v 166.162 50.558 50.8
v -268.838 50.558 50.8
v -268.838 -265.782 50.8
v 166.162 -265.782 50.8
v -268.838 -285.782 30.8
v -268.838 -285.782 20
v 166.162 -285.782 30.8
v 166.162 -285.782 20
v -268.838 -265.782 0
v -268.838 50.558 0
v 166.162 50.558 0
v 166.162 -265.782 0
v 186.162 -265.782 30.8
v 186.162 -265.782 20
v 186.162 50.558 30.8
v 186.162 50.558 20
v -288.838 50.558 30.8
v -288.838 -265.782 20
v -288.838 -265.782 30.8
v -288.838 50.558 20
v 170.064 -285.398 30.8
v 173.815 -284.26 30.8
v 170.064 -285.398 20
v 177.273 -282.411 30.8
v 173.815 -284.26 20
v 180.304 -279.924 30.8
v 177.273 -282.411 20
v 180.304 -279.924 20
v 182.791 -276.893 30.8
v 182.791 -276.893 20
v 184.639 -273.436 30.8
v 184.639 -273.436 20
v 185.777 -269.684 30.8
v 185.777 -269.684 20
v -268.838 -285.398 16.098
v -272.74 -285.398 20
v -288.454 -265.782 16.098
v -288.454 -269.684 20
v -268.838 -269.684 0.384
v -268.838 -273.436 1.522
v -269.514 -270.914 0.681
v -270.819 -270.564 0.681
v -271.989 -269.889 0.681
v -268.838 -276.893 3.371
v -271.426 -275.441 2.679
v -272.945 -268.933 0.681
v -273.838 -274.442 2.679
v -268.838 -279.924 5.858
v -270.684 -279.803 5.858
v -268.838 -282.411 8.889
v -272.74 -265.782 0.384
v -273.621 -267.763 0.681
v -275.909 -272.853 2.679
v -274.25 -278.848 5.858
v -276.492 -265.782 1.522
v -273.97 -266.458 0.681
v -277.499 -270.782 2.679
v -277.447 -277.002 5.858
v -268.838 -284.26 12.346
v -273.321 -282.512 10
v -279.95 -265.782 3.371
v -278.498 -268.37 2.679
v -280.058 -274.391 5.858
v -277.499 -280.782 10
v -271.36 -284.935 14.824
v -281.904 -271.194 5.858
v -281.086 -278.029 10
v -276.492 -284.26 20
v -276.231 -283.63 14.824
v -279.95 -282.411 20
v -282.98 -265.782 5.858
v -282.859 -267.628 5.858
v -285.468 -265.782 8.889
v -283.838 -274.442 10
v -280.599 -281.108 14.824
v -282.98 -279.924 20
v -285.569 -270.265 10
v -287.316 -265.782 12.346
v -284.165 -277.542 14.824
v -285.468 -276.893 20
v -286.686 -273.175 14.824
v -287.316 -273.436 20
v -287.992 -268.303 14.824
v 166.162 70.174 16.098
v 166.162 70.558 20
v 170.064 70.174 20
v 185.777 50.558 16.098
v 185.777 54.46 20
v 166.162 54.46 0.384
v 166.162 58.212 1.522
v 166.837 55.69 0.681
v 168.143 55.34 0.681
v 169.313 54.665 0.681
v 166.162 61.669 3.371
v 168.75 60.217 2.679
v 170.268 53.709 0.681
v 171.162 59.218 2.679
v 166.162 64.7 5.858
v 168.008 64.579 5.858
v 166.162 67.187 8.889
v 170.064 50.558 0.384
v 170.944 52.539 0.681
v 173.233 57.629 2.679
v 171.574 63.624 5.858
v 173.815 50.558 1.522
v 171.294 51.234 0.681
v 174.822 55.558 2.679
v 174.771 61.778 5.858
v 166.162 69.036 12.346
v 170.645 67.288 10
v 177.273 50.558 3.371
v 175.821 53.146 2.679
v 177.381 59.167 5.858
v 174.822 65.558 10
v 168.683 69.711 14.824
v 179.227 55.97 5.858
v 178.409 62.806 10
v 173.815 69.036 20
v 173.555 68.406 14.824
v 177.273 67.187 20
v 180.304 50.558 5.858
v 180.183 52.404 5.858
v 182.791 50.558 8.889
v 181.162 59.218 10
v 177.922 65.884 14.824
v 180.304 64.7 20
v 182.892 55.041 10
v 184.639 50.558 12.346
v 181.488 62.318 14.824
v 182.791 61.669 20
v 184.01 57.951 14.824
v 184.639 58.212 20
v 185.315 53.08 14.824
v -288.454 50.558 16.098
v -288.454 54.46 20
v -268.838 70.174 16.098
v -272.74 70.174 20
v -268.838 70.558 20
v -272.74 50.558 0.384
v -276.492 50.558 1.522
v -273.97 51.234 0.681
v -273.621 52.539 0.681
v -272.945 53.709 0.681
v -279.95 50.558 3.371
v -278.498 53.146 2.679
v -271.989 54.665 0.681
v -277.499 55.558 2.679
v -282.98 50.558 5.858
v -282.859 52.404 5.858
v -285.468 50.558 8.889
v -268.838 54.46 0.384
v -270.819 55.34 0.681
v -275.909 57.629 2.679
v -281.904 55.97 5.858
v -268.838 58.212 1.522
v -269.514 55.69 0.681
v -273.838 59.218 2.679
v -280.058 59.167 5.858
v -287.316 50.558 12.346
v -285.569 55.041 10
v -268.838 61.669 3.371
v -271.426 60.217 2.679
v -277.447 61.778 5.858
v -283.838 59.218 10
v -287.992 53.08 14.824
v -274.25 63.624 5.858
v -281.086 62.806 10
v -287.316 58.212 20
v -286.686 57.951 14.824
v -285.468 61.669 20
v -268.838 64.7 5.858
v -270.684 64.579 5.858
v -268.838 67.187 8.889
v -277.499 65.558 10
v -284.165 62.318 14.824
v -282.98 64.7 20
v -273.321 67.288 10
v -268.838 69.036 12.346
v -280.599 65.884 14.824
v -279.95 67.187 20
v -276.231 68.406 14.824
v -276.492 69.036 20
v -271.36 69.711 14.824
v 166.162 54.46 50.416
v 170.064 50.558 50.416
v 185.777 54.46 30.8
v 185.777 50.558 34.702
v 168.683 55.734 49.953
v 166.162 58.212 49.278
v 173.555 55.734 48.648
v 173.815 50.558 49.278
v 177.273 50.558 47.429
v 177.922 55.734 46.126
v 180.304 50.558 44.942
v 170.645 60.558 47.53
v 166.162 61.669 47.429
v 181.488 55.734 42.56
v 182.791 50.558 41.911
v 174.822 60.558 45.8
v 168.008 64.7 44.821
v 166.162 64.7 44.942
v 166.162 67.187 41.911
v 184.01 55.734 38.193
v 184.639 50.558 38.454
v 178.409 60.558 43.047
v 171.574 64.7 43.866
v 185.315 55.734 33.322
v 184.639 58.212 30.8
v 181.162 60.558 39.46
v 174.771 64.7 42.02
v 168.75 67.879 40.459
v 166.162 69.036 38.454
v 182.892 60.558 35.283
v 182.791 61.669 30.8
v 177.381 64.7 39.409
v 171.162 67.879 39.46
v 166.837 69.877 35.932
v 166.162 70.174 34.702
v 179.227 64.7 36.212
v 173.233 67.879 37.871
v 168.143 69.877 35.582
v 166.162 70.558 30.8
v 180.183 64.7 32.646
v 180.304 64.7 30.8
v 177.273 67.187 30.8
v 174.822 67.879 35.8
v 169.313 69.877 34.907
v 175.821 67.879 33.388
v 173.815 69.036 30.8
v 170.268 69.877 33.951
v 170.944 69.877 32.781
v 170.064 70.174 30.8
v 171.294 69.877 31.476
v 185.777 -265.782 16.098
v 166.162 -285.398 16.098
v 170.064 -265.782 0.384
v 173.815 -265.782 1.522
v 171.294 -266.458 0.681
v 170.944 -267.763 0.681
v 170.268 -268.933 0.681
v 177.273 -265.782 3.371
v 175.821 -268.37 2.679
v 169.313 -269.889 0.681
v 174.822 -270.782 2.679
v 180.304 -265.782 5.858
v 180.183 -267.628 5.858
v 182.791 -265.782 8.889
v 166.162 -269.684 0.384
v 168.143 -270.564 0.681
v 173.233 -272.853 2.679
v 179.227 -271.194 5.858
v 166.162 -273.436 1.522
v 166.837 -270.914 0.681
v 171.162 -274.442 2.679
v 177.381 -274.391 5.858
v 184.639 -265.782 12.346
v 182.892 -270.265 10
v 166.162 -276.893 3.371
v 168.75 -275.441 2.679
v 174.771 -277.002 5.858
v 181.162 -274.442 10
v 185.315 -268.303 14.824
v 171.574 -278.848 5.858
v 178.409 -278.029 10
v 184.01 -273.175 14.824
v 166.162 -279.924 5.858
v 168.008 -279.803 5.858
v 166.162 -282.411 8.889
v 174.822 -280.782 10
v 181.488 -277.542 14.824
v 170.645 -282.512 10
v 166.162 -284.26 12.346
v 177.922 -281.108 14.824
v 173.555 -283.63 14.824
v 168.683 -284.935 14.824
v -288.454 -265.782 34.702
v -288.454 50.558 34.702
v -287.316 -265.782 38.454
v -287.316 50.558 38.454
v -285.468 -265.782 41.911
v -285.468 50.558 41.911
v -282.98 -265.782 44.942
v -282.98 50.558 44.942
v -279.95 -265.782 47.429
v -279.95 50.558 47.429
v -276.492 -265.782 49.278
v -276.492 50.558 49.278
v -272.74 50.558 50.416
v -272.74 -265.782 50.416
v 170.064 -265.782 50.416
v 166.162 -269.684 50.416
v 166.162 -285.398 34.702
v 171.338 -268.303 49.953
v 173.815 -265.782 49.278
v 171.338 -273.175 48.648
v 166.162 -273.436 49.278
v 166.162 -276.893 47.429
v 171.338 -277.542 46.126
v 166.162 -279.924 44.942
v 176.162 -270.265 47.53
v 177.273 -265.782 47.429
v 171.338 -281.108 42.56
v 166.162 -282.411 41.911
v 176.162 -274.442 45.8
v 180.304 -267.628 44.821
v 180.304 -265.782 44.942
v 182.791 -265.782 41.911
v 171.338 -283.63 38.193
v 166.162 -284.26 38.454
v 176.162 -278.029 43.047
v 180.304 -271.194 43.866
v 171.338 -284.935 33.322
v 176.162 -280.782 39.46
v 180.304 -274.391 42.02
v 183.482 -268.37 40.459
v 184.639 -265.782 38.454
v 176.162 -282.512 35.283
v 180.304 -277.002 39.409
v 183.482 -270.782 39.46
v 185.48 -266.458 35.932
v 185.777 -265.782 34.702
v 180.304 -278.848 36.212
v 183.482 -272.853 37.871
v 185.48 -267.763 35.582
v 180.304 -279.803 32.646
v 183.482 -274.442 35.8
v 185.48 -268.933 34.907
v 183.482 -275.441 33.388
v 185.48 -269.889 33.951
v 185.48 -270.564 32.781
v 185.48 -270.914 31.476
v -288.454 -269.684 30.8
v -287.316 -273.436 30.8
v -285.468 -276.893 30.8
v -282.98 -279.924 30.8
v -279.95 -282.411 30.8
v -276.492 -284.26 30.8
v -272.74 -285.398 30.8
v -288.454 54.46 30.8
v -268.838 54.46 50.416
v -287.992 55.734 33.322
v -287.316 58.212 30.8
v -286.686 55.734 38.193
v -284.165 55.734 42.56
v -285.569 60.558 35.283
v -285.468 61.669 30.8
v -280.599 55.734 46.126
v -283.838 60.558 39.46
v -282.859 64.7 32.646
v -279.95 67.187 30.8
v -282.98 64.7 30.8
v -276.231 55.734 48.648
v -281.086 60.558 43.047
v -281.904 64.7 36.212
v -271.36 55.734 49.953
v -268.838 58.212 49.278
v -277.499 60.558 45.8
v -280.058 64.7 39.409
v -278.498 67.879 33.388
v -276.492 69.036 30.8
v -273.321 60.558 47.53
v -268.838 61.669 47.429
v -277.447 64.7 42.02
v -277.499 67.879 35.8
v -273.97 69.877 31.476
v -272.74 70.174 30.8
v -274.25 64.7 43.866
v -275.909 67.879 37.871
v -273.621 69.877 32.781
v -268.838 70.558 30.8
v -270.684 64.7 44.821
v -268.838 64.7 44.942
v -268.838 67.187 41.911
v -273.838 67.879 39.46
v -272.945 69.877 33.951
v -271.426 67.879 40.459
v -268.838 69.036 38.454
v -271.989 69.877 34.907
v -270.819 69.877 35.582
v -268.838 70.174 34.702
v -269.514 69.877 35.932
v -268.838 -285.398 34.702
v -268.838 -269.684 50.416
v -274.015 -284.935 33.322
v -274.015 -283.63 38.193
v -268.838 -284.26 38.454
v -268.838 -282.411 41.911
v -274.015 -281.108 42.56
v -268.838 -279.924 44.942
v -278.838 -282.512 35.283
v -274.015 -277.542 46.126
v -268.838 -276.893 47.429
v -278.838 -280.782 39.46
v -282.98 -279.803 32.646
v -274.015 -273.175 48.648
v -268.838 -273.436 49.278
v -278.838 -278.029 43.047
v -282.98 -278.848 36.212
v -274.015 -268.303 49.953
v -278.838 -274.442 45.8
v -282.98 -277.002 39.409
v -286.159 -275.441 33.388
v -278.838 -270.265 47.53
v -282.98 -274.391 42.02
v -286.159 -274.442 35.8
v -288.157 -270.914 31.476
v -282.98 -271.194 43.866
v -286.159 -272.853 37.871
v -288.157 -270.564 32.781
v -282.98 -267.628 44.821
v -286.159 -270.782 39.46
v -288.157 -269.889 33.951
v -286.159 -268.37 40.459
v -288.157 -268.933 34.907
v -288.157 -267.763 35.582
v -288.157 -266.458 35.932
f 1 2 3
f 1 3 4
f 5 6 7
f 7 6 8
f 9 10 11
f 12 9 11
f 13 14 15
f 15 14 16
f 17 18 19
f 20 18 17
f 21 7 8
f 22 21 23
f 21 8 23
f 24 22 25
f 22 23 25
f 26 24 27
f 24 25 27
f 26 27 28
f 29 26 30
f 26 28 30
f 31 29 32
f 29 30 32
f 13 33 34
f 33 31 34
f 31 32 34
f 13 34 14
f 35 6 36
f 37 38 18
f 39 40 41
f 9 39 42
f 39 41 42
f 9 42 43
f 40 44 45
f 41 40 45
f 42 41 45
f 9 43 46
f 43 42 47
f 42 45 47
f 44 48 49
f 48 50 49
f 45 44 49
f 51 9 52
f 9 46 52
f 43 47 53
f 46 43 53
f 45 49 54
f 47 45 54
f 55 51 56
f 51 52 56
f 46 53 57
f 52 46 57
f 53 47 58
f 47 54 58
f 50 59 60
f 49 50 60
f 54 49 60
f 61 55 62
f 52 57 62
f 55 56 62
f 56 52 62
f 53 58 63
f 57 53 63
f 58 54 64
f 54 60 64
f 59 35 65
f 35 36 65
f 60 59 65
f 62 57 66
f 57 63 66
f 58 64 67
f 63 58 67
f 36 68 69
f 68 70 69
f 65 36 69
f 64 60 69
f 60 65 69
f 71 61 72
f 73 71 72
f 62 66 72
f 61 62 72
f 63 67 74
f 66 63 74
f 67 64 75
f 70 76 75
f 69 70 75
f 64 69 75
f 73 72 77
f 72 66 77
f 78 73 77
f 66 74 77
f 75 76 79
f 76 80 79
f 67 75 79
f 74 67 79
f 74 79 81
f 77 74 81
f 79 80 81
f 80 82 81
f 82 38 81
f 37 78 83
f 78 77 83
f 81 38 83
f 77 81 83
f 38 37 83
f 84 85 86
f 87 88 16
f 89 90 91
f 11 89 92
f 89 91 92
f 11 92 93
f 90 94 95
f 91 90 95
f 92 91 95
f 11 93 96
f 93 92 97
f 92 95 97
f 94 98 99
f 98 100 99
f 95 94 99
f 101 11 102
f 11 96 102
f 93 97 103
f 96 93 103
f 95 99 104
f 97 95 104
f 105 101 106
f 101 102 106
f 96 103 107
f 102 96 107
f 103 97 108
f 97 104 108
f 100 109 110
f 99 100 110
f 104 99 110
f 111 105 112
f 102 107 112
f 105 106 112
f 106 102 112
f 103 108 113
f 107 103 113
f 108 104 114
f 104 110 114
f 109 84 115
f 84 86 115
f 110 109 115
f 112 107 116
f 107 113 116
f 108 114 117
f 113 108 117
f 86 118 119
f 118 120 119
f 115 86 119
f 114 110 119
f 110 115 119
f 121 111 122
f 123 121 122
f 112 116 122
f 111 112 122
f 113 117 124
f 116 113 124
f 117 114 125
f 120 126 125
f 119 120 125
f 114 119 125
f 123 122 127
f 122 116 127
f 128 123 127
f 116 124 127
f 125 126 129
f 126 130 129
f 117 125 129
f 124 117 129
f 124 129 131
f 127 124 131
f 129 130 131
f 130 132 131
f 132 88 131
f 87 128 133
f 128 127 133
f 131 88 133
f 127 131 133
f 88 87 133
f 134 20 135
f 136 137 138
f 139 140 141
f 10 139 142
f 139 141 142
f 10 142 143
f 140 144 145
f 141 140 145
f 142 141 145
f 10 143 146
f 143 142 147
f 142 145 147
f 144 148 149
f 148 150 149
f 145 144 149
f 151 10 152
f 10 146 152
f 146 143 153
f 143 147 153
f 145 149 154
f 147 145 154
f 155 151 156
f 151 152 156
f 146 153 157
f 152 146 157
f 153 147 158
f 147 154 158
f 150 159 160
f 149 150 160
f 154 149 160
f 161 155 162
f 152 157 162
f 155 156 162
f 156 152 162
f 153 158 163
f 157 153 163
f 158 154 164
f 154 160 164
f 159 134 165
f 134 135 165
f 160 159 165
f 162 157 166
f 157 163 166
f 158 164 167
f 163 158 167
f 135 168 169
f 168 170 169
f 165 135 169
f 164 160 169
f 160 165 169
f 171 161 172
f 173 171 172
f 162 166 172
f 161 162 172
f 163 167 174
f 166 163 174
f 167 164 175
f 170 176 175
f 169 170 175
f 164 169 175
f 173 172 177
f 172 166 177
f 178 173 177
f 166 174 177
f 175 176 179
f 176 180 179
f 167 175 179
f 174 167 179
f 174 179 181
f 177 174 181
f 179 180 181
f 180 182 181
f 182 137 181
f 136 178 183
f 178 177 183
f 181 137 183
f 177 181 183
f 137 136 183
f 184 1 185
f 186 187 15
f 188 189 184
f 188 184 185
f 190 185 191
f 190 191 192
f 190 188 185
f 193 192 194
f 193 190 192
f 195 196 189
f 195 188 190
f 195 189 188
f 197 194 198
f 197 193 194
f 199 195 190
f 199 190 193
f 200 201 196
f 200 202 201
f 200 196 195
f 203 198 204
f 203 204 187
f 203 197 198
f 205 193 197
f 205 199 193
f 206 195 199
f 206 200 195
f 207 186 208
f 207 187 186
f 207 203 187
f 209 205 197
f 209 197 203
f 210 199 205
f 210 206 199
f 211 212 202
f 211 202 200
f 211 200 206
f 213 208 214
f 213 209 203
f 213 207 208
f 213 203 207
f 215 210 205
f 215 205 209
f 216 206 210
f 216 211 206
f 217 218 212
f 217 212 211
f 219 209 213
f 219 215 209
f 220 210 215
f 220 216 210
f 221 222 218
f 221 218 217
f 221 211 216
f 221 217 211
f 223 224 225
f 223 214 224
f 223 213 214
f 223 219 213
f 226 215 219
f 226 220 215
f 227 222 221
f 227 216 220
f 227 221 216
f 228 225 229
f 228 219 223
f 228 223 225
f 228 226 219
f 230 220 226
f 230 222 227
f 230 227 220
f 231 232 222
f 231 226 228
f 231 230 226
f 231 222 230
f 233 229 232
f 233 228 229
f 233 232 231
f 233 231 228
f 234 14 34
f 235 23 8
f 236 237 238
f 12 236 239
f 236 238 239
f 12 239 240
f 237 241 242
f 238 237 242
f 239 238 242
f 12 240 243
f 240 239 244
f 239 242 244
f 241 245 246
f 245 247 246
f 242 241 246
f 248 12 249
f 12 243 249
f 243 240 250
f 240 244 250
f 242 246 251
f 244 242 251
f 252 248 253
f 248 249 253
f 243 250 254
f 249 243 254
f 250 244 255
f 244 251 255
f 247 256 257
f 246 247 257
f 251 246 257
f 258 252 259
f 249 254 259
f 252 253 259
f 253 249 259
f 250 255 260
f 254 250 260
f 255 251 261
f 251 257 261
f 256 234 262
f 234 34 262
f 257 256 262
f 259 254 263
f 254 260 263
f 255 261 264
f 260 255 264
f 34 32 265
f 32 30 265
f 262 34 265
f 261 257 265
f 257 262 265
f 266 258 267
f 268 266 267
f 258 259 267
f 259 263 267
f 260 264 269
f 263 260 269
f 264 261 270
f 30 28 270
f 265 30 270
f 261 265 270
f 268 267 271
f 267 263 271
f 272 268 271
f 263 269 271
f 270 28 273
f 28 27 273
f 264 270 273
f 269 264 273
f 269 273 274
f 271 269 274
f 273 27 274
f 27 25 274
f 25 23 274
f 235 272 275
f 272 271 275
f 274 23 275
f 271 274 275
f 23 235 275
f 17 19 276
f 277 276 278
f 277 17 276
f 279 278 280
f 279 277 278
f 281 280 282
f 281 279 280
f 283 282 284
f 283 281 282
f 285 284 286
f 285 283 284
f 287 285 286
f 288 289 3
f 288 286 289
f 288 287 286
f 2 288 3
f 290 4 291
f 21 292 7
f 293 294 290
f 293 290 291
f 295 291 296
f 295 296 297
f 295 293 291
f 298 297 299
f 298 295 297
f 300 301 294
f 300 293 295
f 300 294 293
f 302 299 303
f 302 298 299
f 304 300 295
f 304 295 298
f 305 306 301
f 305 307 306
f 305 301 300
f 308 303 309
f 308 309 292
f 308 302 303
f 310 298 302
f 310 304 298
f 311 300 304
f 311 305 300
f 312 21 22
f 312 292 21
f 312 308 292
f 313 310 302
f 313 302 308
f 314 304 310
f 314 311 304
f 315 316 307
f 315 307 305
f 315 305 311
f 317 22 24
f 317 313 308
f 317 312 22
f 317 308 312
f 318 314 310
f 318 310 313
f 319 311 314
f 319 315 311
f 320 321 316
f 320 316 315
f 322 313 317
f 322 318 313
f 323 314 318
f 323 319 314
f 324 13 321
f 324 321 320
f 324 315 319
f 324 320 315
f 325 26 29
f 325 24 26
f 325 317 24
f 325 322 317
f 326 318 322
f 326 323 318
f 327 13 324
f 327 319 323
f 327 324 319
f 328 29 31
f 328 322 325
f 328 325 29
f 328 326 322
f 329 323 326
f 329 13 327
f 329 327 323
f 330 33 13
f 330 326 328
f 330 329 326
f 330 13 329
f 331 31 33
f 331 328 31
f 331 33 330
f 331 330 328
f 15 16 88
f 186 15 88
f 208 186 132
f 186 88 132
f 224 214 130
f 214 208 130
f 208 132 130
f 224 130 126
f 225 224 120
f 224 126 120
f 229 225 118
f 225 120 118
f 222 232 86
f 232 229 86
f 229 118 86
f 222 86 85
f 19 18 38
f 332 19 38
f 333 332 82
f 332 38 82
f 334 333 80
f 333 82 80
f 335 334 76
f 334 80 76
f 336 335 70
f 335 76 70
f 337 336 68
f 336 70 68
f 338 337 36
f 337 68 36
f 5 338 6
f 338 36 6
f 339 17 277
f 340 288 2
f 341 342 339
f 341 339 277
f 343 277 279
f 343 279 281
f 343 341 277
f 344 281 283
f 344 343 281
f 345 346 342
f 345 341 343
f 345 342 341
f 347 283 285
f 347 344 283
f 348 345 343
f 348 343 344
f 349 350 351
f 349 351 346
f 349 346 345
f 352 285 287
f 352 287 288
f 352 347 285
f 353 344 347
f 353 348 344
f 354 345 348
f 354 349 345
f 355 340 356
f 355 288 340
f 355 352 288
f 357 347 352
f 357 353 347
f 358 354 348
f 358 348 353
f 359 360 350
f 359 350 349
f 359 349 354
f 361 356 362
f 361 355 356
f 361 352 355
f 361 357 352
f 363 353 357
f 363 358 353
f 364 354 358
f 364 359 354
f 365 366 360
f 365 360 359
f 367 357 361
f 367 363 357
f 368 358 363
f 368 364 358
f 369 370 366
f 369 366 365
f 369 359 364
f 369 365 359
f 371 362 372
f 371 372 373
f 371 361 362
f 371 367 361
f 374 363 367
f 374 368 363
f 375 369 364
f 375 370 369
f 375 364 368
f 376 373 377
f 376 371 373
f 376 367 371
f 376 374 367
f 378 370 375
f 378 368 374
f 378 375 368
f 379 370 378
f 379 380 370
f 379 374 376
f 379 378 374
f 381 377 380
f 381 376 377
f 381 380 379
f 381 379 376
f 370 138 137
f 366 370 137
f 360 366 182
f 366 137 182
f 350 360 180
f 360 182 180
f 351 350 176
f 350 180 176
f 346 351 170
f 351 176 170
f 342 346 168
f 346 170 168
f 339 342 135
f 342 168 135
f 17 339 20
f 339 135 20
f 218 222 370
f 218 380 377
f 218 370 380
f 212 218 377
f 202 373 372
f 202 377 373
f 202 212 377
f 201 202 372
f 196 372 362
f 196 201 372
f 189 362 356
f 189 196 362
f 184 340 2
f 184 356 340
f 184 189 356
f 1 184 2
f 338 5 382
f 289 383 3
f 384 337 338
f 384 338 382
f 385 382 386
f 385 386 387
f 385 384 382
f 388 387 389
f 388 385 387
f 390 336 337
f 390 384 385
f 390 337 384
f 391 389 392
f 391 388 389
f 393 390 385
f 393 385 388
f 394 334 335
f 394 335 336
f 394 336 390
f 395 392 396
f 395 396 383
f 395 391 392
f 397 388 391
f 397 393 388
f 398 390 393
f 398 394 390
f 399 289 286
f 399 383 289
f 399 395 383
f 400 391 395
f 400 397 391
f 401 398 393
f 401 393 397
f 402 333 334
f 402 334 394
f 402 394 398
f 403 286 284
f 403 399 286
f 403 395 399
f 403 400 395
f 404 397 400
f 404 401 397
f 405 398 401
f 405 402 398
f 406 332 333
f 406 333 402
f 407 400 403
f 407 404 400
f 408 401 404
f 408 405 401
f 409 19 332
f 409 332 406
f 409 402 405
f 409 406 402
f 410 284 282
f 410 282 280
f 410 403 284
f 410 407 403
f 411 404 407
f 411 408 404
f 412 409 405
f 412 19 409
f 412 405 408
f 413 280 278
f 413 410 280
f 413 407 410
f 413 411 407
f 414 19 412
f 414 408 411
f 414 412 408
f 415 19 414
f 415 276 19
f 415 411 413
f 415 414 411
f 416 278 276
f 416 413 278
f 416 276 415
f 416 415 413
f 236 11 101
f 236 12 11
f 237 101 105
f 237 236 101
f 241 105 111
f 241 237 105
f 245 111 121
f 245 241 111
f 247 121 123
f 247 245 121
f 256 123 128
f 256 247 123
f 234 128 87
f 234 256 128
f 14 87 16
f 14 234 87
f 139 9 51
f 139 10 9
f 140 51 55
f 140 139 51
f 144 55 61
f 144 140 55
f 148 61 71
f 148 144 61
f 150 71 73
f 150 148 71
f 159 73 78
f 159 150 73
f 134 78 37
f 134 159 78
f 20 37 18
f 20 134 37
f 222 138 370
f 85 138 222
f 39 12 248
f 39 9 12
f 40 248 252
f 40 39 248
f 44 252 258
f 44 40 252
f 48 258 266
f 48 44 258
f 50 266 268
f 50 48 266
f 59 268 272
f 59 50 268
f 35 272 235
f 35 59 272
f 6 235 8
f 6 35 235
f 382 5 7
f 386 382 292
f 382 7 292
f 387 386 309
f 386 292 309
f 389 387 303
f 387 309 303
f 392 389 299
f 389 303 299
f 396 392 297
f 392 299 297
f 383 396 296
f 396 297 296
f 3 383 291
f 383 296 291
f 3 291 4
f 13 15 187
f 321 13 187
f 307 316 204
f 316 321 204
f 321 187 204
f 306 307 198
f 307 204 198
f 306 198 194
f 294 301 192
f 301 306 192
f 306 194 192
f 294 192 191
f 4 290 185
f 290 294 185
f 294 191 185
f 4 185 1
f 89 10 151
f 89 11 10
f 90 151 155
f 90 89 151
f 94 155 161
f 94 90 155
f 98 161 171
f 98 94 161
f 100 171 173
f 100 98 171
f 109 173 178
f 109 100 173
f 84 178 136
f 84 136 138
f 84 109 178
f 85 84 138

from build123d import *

# Parameters (mm, degrees)
SKETCH1_W           = 475
SKETCH1_H           = 356.34
BOSS_EXTRUDE1_DEPTH = 50.8
FILLET2_R           = 20
FILLET6_R           = 20
FILLET7_R           = 20


with BuildPart() as part:
    # Sketch1 → Boss-Extrude1 (new body)
    with BuildSketch(Plane.XY):
        with Locations((-51.338268793, -107.61191344)):
            Rectangle(SKETCH1_W, SKETCH1_H)
    extrude(amount=BOSS_EXTRUDE1_DEPTH)

    # Fillet2
    fillet2_edges = [part.edges().sort_by_distance(p)[0] for p in [
        (186.161731207, -107.61191344, 50.8),
        (-51.338268793, 70.55808656, 50.8),
        (-288.838268793, -107.61191344, 50.8),
        (-51.338268793, -285.78191344, 50.8),
    ]]
    fillet(fillet2_edges, radius=FILLET2_R)

    # Fillet6
    # the kernel refuses this fillet: 20 mm, written as the material it takes off along each edge
    with BuildSketch(Plane(origin=(166.161731207, 50.55808656, 30.8), x_dir=(1, 0, 0), z_dir=(0, 1, 0))) as fillet6_piece_1_section:
        Polygon((0, 0), (FILLET6_R * 1.02, 0), (FILLET6_R * 1.02, -FILLET6_R * 1.02), (0, -FILLET6_R * 1.02), align=None)
    fillet6_piece_1 = extrude(amount=FILLET6_R * 1.02, mode=Mode.PRIVATE)
    fillet6_piece_1 = fillet6_piece_1 - Plane(origin=(166.161731207, 50.55808656, 30.8), x_dir=(-0.7071067811865475, 0, -0.7071067811865475), z_dir=(0, 1, 0)) * Sphere(FILLET6_R, mode=Mode.PRIVATE)
    add(fillet6_piece_1, mode=Mode.SUBTRACT)
    with BuildSketch(Plane(origin=(166.161731207, -265.78191344, 30.8), x_dir=(0, -1, 0), z_dir=(1, 0, 0))) as fillet6_piece_2_section:
        Polygon((0, 0), (FILLET6_R * 1.02, 0), (FILLET6_R * 1.02, -FILLET6_R * 1.02), (0, -FILLET6_R * 1.02), align=None)
    fillet6_piece_2 = extrude(amount=FILLET6_R * 1.02, mode=Mode.PRIVATE)
    fillet6_piece_2 = fillet6_piece_2 - Plane(origin=(166.161731207, -265.78191344, 30.8), x_dir=(0, 0.7071067811865475, -0.7071067811865475), z_dir=(1, 0, 0)) * Sphere(FILLET6_R, mode=Mode.PRIVATE)
    add(fillet6_piece_2, mode=Mode.SUBTRACT)
    with BuildSketch(Plane(origin=(-268.838268793, 50.55808656, 30.8), x_dir=(-1, 0, 0), z_dir=(0, 1, 0))) as fillet6_piece_3_section:
        Polygon((0, 0), (FILLET6_R * 1.02, 0), (FILLET6_R * 1.02, FILLET6_R * 1.02), (0, FILLET6_R * 1.02), align=None)
    fillet6_piece_3 = extrude(amount=FILLET6_R * 1.02, mode=Mode.PRIVATE)
    fillet6_piece_3 = fillet6_piece_3 - Plane(origin=(-268.838268793, 50.55808656, 30.8), x_dir=(0.7071067811865475, 0, -0.7071067811865475), z_dir=(0, 1, 0)) * Sphere(FILLET6_R, mode=Mode.PRIVATE)
    add(fillet6_piece_3, mode=Mode.SUBTRACT)
    with BuildSketch(Plane(origin=(-268.838268793, -265.78191344, 30.8), x_dir=(0, -1, 0), z_dir=(-1, 0, 0))) as fillet6_piece_4_section:
        Polygon((0, 0), (FILLET6_R * 1.02, 0), (FILLET6_R * 1.02, FILLET6_R * 1.02), (0, FILLET6_R * 1.02), align=None)
    fillet6_piece_4 = extrude(amount=FILLET6_R * 1.02, mode=Mode.PRIVATE)
    fillet6_piece_4 = fillet6_piece_4 - Plane(origin=(-268.838268793, -265.78191344, 30.8), x_dir=(0, 0.7071067811865475, -0.7071067811865475), z_dir=(-1, 0, 0)) * Sphere(FILLET6_R, mode=Mode.PRIVATE)
    add(fillet6_piece_4, mode=Mode.SUBTRACT)
    with BuildSketch(Plane(origin=(-288.838268793, -285.78191344, -50), x_dir=(0, 1, 0), z_dir=(0, 0, 1)), Plane(origin=(-288.838268793, 70.55808656, -50), x_dir=(1, 0, 0), z_dir=(0, 0, 1))) as fillet6_piece_5:
        with BuildLine():
            CenterArc((FILLET6_R, -FILLET6_R), FILLET6_R, 90, 90)
            Line((0, -FILLET6_R), (0, 0))
            Line((0, 0), (FILLET6_R, 0))
        make_face()
    extrude(amount=80.8, mode=Mode.SUBTRACT)
    with BuildSketch(Plane(origin=(186.161731207, -285.78191344, -50), x_dir=(0, 1, 0), z_dir=(0, 0, 1)), Plane(origin=(186.161731207, 70.55808656, -50), x_dir=(-1, 0, 0), z_dir=(0, 0, 1))) as fillet6_piece_6:
        with BuildLine():
            CenterArc((FILLET6_R, FILLET6_R), FILLET6_R, 180, 90)
            Line((0, FILLET6_R), (0, 0))
            Line((0, 0), (FILLET6_R, 0))
        make_face()
    extrude(amount=80.8, mode=Mode.SUBTRACT)

    # Fillet7
    fillet7_edges = [part.edges().sort_by_distance(p)[0] for p in [
        (-51.338268793, 70.55808656, 0),
        (-288.838268793, -107.61191344, 0),
        (186.161731207, -107.61191344, 0),
        (-51.338268793, -285.78191344, 0),
        (-282.980404416, 64.700222184, 0),
        (-282.980404416, -279.924049063, 0),
        (180.303866831, -279.924049063, 0),
        (180.303866831, 64.700222184, 0),
    ]]
    fillet(fillet7_edges, radius=FILLET7_R)


solid = part.part
